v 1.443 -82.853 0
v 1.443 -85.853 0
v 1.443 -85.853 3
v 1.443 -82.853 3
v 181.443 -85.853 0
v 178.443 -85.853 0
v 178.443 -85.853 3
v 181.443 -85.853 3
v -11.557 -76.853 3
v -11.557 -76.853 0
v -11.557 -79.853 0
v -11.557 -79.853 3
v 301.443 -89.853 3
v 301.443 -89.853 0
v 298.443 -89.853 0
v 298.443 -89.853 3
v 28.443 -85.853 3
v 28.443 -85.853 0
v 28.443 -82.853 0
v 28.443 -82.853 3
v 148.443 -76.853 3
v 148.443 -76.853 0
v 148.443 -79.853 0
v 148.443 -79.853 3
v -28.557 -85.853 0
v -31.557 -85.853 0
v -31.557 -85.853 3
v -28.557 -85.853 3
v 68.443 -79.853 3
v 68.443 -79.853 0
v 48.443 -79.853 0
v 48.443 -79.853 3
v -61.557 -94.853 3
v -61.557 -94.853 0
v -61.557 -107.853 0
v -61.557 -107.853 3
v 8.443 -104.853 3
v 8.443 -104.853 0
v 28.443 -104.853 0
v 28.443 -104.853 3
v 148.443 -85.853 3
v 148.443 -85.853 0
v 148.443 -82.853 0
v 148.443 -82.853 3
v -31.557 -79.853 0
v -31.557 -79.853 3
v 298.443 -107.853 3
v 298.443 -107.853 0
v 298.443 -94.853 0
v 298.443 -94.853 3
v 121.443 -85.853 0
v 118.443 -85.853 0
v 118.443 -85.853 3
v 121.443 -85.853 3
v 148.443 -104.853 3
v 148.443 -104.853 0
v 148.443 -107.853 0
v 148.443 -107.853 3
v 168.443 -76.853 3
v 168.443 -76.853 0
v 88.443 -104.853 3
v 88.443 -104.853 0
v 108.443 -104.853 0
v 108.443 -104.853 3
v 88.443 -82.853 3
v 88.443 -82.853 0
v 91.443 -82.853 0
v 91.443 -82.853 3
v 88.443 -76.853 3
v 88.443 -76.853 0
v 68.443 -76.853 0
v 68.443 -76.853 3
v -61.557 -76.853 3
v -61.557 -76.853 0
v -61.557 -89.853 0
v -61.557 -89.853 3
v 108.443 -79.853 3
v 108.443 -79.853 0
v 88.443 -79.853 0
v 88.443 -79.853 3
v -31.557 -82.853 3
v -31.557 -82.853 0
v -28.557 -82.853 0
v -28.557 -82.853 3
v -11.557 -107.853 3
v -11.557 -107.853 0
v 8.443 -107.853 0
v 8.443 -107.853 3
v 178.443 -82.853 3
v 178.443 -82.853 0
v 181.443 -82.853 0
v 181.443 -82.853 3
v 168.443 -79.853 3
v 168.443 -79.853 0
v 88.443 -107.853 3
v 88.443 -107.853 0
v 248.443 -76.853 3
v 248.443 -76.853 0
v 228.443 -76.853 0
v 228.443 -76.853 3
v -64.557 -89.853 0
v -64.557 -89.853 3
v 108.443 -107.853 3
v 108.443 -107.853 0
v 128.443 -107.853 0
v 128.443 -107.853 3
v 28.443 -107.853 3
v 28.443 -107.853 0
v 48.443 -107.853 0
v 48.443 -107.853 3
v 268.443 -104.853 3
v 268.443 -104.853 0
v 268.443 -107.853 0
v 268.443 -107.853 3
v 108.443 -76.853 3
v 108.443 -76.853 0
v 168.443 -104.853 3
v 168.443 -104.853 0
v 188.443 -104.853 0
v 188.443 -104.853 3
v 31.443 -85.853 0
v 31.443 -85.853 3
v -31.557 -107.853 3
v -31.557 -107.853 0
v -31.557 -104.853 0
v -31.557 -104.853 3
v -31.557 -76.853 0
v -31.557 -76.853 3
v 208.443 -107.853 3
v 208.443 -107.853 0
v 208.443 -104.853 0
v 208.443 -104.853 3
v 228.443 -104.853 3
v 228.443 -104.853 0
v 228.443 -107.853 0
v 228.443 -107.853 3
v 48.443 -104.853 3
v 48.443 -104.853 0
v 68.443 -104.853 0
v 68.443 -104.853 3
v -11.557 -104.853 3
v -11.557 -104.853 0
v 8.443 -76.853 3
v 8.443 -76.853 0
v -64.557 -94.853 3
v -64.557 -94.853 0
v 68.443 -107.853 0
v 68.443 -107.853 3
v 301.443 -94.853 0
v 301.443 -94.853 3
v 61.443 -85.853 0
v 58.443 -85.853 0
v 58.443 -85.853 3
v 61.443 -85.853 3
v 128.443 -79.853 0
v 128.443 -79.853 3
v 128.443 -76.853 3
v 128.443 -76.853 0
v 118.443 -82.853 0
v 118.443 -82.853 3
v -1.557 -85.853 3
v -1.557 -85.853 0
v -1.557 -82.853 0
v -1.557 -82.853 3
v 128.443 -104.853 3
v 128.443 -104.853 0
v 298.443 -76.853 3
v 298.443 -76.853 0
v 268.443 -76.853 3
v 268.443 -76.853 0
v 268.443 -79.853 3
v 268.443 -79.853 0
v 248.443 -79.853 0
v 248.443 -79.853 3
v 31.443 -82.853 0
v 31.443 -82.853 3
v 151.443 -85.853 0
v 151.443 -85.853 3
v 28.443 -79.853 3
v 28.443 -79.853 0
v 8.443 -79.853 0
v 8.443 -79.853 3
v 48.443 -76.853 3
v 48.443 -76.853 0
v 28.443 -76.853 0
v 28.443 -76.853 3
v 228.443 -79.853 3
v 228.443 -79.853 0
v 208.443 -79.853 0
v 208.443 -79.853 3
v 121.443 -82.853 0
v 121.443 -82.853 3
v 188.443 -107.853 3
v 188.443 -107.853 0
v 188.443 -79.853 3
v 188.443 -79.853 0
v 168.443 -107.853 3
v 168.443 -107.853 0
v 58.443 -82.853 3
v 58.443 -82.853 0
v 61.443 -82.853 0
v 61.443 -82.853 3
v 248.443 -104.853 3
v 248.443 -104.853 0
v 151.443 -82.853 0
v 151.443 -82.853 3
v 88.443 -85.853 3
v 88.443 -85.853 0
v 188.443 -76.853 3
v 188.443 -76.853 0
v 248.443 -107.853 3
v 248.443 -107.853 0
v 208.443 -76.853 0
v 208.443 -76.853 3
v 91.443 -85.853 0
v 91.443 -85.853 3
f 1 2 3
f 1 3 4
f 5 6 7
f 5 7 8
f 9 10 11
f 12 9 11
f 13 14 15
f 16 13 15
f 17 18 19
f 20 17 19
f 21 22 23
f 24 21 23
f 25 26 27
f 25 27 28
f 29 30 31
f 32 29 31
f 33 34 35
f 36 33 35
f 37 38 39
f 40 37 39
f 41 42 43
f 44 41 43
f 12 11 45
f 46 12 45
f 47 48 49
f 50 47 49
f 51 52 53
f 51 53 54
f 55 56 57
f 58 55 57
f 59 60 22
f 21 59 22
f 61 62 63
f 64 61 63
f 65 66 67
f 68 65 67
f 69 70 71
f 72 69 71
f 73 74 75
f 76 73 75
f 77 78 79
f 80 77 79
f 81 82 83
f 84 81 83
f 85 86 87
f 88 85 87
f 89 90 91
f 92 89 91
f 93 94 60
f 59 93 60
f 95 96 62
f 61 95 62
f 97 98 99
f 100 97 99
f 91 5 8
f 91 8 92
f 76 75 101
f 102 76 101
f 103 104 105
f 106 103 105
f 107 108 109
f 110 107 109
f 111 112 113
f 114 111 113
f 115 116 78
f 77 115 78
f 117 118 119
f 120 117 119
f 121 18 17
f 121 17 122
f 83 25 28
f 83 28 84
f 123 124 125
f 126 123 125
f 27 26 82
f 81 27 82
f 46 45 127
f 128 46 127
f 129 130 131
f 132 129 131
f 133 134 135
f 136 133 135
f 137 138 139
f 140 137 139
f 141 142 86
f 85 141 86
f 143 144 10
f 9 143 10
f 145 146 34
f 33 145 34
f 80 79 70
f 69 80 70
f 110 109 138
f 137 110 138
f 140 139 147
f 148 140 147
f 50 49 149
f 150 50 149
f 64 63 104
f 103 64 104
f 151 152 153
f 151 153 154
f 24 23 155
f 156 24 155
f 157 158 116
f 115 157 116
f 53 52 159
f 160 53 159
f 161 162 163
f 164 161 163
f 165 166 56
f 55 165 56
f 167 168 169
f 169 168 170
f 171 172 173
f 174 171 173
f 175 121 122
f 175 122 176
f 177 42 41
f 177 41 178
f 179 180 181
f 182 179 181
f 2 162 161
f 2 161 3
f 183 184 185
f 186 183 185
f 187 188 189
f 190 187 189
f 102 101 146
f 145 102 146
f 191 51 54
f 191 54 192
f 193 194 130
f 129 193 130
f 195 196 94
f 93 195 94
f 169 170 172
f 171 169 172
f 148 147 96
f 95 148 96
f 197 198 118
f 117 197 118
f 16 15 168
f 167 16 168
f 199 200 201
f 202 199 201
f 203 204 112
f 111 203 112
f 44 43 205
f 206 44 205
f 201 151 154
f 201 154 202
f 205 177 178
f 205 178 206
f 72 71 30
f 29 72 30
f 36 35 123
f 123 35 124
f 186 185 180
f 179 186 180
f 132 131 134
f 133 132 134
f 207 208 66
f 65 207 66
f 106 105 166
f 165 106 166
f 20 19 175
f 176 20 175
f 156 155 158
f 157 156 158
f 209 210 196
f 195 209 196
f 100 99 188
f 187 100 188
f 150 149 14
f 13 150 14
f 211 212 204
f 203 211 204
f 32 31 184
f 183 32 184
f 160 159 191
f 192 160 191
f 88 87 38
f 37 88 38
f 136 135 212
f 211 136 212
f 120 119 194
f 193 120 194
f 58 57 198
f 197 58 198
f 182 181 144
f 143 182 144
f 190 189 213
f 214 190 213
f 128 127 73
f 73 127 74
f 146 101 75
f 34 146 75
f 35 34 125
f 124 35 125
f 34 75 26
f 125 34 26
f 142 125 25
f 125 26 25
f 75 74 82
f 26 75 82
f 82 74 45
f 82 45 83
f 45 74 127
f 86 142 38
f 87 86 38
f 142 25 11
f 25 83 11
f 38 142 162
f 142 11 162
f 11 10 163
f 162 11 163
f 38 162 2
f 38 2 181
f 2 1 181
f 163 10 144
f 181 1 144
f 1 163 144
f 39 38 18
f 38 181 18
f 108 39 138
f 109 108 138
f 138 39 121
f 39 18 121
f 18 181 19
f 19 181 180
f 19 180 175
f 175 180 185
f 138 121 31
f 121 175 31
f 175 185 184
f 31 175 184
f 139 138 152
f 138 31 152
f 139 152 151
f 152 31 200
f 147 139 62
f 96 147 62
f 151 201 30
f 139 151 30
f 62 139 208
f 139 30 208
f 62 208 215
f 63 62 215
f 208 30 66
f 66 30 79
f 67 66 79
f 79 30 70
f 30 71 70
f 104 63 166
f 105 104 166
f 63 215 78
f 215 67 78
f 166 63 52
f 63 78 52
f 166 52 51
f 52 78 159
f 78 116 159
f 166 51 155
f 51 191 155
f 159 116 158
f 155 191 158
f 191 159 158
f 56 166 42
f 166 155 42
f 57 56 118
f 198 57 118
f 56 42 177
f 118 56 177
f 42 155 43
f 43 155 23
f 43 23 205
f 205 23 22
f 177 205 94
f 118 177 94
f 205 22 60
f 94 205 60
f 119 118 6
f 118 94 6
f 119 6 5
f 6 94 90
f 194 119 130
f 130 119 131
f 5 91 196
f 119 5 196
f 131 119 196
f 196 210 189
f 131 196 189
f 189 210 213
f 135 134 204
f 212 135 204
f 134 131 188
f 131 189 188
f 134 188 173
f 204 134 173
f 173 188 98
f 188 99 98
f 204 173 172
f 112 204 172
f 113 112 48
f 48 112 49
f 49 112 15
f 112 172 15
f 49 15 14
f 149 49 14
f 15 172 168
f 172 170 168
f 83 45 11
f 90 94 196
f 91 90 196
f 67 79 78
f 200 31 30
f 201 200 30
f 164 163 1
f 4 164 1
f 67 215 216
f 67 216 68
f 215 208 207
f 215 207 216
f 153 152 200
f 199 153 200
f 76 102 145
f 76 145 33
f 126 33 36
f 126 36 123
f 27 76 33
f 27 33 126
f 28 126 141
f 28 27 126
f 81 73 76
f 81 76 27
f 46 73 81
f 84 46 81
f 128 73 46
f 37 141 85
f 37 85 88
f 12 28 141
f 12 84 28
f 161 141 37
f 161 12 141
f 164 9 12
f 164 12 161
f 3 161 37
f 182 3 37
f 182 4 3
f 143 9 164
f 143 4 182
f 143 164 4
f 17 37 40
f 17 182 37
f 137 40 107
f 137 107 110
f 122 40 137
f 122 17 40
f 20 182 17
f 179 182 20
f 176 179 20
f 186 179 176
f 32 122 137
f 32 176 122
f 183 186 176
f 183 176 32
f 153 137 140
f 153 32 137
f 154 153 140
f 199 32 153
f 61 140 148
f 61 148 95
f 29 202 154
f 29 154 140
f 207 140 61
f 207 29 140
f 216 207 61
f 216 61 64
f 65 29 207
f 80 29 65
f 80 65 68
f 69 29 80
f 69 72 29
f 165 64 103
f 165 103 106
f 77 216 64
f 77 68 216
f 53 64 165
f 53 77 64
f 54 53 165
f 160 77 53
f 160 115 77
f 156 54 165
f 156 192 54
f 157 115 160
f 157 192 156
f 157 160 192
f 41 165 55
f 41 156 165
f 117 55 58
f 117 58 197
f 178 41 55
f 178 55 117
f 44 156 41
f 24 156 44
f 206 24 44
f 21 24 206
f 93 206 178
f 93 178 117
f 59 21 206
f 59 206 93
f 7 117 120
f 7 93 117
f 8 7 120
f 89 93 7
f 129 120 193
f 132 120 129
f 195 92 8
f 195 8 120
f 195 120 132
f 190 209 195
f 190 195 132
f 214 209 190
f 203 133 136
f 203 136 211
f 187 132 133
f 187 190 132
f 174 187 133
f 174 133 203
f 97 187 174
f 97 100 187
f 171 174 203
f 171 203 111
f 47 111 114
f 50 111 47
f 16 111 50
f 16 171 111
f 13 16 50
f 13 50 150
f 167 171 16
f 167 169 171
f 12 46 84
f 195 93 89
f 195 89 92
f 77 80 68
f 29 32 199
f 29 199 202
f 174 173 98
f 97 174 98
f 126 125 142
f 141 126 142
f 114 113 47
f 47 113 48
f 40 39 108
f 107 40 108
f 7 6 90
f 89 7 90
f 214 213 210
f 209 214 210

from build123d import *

# Parameters (mm, degrees)
SKETCH1_W           = 3
SKETCH1_H           = 3
BOSS_EXTRUDE2_DEPTH = 3


with BuildPart() as part:
    # Sketch1 → Boss-Extrude2 (new body)
    with BuildSketch(Plane.XY):
        Polygon((28.442880719, -76.852652167), (28.442880719, -79.852652167), (8.442880719, -79.852652167), (8.442880719, -76.852652167), (-11.557119281, -76.852652167), (-11.557119281, -79.852652167), (-31.557119281, -79.852652167), (-31.557119281, -76.852652167), (-61.557119281, -76.852652167), (-61.557119281, -79.852652167), (-61.557119281, -89.852652167), (-64.557119281, -89.852652167), (-64.557119281, -94.852652167), (-61.557119281, -94.852652167), (-61.557119281, -104.852652167), (-61.557119281, -107.852652167), (-31.557119281, -107.852652167), (-31.557119281, -104.852652167), (-11.557119281, -104.852652167), (-11.557119281, -107.852652167), (8.442880719, -107.852652167), (8.442880719, -104.852652167), (28.442880719, -104.852652167), (28.442880719, -107.852652167), (48.442880719, -107.852652167), (48.442880719, -104.852652167), (68.442880719, -104.852652167), (68.442880719, -107.852652167), (88.442880719, -107.852652167), (88.442880719, -104.852652167), (108.442880719, -104.852652167), (108.442880719, -107.852652167), (128.442880719, -107.852652167), (128.442880719, -104.852652167), (148.442880719, -104.852652167), (148.442880719, -107.852652167), (168.442880719, -107.852652167), (168.442880719, -104.852652167), (188.442880719, -104.852652167), (188.442880719, -107.852652167), (208.442880719, -107.852652167), (208.442880719, -104.852652167), (228.442880719, -104.852652167), (228.442880719, -107.852652167), (248.442880719, -107.852652167), (248.442880719, -104.852652167), (268.442880719, -104.852652167), (268.442880719, -107.852652167), (298.442880719, -107.852652167), (298.442880719, -104.852652167), (298.442880719, -94.852652167), (301.442880719, -94.852652167), (301.442880719, -89.852652167), (298.442880719, -89.852652167), (298.442880719, -79.852652167), (298.442880719, -76.852652167), (268.442880719, -76.852652167), (268.442880719, -79.852652167), (248.442880719, -79.852652167), (248.442880719, -76.852652167), (228.442880719, -76.852652167), (228.442880719, -79.852652167), (208.442880719, -79.852652167), (208.442880719, -76.852652167), (188.442880719, -76.852652167), (188.442880719, -79.852652167), (168.442880719, -79.852652167), (168.442880719, -76.852652167), (148.442880719, -76.852652167), (148.442880719, -79.852652167), (128.442880719, -79.852652167), (128.442880719, -76.852652167), (108.442880719, -76.852652167), (108.442880719, -79.852652167), (88.442880719, -79.852652167), (88.442880719, -76.852652167), (68.442880719, -76.852652167), (68.442880719, -79.852652167), (48.442880719, -79.852652167), (48.442880719, -76.852652167), align=None)
        with Locations((-0.057119281, -84.352652167)):
            Rectangle(SKETCH1_W, SKETCH1_H, mode=Mode.SUBTRACT)
        with Locations((-30.057119281, -84.352652167)):
            Rectangle(SKETCH1_W, SKETCH1_H, mode=Mode.SUBTRACT)
        with Locations((29.942880719, -84.352652167)):
            Rectangle(SKETCH1_W, SKETCH1_H, mode=Mode.SUBTRACT)
        with Locations((59.942880719, -84.352652167)):
            Rectangle(SKETCH1_W, SKETCH1_H, mode=Mode.SUBTRACT)
        with Locations((89.942880719, -84.352652167)):
            Rectangle(SKETCH1_W, SKETCH1_H, mode=Mode.SUBTRACT)
        with Locations((119.942880719, -84.352652167)):
            Rectangle(SKETCH1_W, SKETCH1_H, mode=Mode.SUBTRACT)
        with Locations((149.942880719, -84.352652167)):
            Rectangle(SKETCH1_W, SKETCH1_H, mode=Mode.SUBTRACT)
        with Locations((179.942880719, -84.352652167)):
            Rectangle(SKETCH1_W, SKETCH1_H, mode=Mode.SUBTRACT)
    extrude(amount=BOSS_EXTRUDE2_DEPTH)


solid = part.part
